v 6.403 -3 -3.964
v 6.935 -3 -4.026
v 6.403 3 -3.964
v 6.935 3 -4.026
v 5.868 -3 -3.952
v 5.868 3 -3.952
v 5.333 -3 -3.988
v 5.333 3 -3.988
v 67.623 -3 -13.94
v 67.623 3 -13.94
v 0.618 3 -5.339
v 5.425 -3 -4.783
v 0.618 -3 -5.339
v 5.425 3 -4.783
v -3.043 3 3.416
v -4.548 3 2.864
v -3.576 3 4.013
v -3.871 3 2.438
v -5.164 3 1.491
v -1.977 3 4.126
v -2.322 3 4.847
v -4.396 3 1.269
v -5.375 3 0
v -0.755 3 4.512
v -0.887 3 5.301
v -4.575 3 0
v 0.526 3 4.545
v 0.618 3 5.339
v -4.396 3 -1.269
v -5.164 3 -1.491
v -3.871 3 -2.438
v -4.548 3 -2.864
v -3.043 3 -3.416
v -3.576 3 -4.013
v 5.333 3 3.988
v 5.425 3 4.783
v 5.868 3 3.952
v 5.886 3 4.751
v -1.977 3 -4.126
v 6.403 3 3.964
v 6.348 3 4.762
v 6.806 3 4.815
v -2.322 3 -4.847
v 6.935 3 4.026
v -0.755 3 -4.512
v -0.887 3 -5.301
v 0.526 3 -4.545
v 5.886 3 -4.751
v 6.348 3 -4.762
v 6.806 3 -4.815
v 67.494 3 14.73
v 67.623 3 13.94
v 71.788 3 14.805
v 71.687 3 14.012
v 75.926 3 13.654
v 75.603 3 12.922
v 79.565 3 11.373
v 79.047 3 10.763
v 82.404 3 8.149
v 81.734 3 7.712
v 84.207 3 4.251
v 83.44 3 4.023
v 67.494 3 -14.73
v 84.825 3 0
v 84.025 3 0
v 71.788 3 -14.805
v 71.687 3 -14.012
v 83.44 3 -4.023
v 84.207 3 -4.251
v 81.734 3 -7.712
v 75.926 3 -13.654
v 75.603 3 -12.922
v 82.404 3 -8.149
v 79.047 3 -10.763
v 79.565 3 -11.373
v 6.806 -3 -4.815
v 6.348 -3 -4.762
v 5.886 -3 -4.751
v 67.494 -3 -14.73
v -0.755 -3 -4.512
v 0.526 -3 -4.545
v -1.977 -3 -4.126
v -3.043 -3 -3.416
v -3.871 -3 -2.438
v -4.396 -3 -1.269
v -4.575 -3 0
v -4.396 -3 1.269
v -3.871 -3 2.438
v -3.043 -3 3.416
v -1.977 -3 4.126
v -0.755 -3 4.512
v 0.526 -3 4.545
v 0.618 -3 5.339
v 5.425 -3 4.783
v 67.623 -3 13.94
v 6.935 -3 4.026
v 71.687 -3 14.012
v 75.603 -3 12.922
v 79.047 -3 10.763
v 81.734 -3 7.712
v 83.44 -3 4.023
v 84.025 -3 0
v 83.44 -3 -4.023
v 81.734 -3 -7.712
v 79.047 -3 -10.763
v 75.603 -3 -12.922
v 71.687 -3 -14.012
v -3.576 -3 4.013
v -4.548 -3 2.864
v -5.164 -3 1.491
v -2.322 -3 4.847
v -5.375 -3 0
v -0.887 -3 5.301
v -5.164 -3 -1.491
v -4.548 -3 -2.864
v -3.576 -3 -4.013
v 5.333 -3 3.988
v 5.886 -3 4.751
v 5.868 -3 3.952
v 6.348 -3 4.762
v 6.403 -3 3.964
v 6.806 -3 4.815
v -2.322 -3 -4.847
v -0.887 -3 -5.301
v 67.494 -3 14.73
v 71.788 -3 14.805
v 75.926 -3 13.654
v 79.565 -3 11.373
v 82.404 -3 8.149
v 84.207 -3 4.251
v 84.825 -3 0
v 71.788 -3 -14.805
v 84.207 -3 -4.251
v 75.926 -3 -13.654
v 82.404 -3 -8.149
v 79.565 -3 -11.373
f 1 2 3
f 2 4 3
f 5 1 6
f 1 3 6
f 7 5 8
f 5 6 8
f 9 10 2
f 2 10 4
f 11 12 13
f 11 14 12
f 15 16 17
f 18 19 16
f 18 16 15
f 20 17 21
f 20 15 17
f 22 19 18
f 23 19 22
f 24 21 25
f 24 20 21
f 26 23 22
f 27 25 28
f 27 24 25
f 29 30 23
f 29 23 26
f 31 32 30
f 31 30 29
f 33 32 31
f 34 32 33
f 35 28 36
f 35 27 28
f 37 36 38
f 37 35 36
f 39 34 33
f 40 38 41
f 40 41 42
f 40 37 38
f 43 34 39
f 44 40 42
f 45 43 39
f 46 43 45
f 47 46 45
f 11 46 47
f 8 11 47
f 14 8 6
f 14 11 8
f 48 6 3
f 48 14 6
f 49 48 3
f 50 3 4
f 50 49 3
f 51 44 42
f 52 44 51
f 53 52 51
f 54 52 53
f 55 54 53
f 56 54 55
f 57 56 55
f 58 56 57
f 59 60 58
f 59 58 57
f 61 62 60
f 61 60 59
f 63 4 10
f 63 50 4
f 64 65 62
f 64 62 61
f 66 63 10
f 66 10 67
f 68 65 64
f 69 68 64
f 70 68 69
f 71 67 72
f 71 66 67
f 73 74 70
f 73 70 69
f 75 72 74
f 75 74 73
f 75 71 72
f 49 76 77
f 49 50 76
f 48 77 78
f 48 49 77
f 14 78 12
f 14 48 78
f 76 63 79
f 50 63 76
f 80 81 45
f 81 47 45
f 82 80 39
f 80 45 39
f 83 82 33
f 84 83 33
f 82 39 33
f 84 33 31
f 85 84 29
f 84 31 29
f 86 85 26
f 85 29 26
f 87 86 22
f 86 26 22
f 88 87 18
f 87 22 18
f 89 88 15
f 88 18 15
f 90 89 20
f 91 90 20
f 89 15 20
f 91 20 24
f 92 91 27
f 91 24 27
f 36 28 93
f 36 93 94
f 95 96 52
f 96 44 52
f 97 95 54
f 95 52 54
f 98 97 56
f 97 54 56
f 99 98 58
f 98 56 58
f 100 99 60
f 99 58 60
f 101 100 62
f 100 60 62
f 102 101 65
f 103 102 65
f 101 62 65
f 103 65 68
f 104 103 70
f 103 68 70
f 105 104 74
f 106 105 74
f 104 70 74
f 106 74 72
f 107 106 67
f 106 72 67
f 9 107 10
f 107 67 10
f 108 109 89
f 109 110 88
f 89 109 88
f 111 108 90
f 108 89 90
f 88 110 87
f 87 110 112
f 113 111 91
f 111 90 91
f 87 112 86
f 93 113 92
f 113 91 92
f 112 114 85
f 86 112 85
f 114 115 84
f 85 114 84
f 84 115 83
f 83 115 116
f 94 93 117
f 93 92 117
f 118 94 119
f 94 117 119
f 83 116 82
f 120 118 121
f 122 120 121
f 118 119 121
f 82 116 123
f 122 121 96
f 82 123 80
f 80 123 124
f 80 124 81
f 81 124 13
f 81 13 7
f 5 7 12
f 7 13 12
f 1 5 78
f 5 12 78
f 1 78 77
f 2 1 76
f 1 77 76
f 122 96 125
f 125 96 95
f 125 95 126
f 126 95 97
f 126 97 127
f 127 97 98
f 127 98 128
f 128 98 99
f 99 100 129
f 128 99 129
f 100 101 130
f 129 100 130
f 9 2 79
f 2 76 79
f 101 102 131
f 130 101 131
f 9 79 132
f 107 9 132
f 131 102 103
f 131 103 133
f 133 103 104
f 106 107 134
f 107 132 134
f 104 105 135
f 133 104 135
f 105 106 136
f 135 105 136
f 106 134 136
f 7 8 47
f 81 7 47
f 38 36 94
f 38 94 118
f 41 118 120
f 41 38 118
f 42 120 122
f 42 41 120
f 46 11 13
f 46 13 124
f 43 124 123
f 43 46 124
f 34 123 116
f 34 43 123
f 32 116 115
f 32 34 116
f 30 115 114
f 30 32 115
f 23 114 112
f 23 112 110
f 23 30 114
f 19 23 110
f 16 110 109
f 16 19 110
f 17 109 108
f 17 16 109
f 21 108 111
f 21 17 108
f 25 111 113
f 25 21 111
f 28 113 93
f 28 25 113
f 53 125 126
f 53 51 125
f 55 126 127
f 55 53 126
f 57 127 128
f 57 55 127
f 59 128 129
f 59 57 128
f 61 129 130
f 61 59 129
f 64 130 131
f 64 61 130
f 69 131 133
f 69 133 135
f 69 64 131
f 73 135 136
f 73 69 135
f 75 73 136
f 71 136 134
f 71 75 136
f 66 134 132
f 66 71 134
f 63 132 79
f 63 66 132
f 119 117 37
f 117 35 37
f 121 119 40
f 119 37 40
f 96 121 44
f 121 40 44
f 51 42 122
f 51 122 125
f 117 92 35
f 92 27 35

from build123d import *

# Parameters (mm, degrees)
LINEAR_AUSTRAGEN_D_NN1_DEPTH      = 3
LINEAR_AUSTRAGEN_D_NN1_DEPTH_BACK = 3


with BuildPart() as part:
    # Skizze1 → Linear-Austragen-Dünn1 (new body, two sides)
    with BuildSketch(Plane(origin=(0, 0, 0), x_dir=(1, 0, 0), z_dir=(0, 1, 0))) as linear_austragen_d_nn1_sk:
        with BuildLine():
            Line((5.425321809, 4.783135297), (0.617779056, 5.339379556))
            ThreePointArc((0.617779056, 5.339379556), (-5.375, 0), (0.617779056, -5.339379556))
            Line((0.617779056, -5.339379556), (5.425321809, -4.783135297))
            ThreePointArc((5.425321809, -4.783135297), (6.11685444, -4.751365683), (6.806147081, -4.815415227))
            Line((6.806147081, -4.815415227), (67.493650964, -14.729735548))
            ThreePointArc((67.493650964, -14.729735548), (84.825, 0), (67.493650964, 14.729735548))
            Line((67.493650964, 14.729735548), (6.806147081, 4.815415227))
            ThreePointArc((6.806147081, 4.815415227), (6.11685444, 4.751365683), (5.425321809, 4.783135297))
        make_face()
        with BuildLine():
            Line((5.333373298, 3.988436945), (0.525830545, 4.544681203))
            ThreePointArc((0.525830545, 4.544681203), (-4.575, 0), (0.525830545, -4.544681203))
            Line((0.525830545, -4.544681203), (5.333373298, -3.988436945))
            ThreePointArc((5.333373298, -3.988436945), (6.135551151, -3.951584192), (6.935130614, -4.025881663))
            Line((6.935130614, -4.025881663), (67.622634497, -13.940201984))
            ThreePointArc((67.622634497, -13.940201984), (84.025, 0), (67.622634497, 13.940201984))
            Line((67.622634497, 13.940201984), (6.935130614, 4.025881663))
            ThreePointArc((6.935130614, 4.025881663), (6.135551151, 3.951584192), (5.333373298, 3.988436945))
        make_face(mode=Mode.SUBTRACT)
    extrude(amount=LINEAR_AUSTRAGEN_D_NN1_DEPTH)
    extrude(linear_austragen_d_nn1_sk.sketch, amount=-LINEAR_AUSTRAGEN_D_NN1_DEPTH_BACK)


solid = part.part
